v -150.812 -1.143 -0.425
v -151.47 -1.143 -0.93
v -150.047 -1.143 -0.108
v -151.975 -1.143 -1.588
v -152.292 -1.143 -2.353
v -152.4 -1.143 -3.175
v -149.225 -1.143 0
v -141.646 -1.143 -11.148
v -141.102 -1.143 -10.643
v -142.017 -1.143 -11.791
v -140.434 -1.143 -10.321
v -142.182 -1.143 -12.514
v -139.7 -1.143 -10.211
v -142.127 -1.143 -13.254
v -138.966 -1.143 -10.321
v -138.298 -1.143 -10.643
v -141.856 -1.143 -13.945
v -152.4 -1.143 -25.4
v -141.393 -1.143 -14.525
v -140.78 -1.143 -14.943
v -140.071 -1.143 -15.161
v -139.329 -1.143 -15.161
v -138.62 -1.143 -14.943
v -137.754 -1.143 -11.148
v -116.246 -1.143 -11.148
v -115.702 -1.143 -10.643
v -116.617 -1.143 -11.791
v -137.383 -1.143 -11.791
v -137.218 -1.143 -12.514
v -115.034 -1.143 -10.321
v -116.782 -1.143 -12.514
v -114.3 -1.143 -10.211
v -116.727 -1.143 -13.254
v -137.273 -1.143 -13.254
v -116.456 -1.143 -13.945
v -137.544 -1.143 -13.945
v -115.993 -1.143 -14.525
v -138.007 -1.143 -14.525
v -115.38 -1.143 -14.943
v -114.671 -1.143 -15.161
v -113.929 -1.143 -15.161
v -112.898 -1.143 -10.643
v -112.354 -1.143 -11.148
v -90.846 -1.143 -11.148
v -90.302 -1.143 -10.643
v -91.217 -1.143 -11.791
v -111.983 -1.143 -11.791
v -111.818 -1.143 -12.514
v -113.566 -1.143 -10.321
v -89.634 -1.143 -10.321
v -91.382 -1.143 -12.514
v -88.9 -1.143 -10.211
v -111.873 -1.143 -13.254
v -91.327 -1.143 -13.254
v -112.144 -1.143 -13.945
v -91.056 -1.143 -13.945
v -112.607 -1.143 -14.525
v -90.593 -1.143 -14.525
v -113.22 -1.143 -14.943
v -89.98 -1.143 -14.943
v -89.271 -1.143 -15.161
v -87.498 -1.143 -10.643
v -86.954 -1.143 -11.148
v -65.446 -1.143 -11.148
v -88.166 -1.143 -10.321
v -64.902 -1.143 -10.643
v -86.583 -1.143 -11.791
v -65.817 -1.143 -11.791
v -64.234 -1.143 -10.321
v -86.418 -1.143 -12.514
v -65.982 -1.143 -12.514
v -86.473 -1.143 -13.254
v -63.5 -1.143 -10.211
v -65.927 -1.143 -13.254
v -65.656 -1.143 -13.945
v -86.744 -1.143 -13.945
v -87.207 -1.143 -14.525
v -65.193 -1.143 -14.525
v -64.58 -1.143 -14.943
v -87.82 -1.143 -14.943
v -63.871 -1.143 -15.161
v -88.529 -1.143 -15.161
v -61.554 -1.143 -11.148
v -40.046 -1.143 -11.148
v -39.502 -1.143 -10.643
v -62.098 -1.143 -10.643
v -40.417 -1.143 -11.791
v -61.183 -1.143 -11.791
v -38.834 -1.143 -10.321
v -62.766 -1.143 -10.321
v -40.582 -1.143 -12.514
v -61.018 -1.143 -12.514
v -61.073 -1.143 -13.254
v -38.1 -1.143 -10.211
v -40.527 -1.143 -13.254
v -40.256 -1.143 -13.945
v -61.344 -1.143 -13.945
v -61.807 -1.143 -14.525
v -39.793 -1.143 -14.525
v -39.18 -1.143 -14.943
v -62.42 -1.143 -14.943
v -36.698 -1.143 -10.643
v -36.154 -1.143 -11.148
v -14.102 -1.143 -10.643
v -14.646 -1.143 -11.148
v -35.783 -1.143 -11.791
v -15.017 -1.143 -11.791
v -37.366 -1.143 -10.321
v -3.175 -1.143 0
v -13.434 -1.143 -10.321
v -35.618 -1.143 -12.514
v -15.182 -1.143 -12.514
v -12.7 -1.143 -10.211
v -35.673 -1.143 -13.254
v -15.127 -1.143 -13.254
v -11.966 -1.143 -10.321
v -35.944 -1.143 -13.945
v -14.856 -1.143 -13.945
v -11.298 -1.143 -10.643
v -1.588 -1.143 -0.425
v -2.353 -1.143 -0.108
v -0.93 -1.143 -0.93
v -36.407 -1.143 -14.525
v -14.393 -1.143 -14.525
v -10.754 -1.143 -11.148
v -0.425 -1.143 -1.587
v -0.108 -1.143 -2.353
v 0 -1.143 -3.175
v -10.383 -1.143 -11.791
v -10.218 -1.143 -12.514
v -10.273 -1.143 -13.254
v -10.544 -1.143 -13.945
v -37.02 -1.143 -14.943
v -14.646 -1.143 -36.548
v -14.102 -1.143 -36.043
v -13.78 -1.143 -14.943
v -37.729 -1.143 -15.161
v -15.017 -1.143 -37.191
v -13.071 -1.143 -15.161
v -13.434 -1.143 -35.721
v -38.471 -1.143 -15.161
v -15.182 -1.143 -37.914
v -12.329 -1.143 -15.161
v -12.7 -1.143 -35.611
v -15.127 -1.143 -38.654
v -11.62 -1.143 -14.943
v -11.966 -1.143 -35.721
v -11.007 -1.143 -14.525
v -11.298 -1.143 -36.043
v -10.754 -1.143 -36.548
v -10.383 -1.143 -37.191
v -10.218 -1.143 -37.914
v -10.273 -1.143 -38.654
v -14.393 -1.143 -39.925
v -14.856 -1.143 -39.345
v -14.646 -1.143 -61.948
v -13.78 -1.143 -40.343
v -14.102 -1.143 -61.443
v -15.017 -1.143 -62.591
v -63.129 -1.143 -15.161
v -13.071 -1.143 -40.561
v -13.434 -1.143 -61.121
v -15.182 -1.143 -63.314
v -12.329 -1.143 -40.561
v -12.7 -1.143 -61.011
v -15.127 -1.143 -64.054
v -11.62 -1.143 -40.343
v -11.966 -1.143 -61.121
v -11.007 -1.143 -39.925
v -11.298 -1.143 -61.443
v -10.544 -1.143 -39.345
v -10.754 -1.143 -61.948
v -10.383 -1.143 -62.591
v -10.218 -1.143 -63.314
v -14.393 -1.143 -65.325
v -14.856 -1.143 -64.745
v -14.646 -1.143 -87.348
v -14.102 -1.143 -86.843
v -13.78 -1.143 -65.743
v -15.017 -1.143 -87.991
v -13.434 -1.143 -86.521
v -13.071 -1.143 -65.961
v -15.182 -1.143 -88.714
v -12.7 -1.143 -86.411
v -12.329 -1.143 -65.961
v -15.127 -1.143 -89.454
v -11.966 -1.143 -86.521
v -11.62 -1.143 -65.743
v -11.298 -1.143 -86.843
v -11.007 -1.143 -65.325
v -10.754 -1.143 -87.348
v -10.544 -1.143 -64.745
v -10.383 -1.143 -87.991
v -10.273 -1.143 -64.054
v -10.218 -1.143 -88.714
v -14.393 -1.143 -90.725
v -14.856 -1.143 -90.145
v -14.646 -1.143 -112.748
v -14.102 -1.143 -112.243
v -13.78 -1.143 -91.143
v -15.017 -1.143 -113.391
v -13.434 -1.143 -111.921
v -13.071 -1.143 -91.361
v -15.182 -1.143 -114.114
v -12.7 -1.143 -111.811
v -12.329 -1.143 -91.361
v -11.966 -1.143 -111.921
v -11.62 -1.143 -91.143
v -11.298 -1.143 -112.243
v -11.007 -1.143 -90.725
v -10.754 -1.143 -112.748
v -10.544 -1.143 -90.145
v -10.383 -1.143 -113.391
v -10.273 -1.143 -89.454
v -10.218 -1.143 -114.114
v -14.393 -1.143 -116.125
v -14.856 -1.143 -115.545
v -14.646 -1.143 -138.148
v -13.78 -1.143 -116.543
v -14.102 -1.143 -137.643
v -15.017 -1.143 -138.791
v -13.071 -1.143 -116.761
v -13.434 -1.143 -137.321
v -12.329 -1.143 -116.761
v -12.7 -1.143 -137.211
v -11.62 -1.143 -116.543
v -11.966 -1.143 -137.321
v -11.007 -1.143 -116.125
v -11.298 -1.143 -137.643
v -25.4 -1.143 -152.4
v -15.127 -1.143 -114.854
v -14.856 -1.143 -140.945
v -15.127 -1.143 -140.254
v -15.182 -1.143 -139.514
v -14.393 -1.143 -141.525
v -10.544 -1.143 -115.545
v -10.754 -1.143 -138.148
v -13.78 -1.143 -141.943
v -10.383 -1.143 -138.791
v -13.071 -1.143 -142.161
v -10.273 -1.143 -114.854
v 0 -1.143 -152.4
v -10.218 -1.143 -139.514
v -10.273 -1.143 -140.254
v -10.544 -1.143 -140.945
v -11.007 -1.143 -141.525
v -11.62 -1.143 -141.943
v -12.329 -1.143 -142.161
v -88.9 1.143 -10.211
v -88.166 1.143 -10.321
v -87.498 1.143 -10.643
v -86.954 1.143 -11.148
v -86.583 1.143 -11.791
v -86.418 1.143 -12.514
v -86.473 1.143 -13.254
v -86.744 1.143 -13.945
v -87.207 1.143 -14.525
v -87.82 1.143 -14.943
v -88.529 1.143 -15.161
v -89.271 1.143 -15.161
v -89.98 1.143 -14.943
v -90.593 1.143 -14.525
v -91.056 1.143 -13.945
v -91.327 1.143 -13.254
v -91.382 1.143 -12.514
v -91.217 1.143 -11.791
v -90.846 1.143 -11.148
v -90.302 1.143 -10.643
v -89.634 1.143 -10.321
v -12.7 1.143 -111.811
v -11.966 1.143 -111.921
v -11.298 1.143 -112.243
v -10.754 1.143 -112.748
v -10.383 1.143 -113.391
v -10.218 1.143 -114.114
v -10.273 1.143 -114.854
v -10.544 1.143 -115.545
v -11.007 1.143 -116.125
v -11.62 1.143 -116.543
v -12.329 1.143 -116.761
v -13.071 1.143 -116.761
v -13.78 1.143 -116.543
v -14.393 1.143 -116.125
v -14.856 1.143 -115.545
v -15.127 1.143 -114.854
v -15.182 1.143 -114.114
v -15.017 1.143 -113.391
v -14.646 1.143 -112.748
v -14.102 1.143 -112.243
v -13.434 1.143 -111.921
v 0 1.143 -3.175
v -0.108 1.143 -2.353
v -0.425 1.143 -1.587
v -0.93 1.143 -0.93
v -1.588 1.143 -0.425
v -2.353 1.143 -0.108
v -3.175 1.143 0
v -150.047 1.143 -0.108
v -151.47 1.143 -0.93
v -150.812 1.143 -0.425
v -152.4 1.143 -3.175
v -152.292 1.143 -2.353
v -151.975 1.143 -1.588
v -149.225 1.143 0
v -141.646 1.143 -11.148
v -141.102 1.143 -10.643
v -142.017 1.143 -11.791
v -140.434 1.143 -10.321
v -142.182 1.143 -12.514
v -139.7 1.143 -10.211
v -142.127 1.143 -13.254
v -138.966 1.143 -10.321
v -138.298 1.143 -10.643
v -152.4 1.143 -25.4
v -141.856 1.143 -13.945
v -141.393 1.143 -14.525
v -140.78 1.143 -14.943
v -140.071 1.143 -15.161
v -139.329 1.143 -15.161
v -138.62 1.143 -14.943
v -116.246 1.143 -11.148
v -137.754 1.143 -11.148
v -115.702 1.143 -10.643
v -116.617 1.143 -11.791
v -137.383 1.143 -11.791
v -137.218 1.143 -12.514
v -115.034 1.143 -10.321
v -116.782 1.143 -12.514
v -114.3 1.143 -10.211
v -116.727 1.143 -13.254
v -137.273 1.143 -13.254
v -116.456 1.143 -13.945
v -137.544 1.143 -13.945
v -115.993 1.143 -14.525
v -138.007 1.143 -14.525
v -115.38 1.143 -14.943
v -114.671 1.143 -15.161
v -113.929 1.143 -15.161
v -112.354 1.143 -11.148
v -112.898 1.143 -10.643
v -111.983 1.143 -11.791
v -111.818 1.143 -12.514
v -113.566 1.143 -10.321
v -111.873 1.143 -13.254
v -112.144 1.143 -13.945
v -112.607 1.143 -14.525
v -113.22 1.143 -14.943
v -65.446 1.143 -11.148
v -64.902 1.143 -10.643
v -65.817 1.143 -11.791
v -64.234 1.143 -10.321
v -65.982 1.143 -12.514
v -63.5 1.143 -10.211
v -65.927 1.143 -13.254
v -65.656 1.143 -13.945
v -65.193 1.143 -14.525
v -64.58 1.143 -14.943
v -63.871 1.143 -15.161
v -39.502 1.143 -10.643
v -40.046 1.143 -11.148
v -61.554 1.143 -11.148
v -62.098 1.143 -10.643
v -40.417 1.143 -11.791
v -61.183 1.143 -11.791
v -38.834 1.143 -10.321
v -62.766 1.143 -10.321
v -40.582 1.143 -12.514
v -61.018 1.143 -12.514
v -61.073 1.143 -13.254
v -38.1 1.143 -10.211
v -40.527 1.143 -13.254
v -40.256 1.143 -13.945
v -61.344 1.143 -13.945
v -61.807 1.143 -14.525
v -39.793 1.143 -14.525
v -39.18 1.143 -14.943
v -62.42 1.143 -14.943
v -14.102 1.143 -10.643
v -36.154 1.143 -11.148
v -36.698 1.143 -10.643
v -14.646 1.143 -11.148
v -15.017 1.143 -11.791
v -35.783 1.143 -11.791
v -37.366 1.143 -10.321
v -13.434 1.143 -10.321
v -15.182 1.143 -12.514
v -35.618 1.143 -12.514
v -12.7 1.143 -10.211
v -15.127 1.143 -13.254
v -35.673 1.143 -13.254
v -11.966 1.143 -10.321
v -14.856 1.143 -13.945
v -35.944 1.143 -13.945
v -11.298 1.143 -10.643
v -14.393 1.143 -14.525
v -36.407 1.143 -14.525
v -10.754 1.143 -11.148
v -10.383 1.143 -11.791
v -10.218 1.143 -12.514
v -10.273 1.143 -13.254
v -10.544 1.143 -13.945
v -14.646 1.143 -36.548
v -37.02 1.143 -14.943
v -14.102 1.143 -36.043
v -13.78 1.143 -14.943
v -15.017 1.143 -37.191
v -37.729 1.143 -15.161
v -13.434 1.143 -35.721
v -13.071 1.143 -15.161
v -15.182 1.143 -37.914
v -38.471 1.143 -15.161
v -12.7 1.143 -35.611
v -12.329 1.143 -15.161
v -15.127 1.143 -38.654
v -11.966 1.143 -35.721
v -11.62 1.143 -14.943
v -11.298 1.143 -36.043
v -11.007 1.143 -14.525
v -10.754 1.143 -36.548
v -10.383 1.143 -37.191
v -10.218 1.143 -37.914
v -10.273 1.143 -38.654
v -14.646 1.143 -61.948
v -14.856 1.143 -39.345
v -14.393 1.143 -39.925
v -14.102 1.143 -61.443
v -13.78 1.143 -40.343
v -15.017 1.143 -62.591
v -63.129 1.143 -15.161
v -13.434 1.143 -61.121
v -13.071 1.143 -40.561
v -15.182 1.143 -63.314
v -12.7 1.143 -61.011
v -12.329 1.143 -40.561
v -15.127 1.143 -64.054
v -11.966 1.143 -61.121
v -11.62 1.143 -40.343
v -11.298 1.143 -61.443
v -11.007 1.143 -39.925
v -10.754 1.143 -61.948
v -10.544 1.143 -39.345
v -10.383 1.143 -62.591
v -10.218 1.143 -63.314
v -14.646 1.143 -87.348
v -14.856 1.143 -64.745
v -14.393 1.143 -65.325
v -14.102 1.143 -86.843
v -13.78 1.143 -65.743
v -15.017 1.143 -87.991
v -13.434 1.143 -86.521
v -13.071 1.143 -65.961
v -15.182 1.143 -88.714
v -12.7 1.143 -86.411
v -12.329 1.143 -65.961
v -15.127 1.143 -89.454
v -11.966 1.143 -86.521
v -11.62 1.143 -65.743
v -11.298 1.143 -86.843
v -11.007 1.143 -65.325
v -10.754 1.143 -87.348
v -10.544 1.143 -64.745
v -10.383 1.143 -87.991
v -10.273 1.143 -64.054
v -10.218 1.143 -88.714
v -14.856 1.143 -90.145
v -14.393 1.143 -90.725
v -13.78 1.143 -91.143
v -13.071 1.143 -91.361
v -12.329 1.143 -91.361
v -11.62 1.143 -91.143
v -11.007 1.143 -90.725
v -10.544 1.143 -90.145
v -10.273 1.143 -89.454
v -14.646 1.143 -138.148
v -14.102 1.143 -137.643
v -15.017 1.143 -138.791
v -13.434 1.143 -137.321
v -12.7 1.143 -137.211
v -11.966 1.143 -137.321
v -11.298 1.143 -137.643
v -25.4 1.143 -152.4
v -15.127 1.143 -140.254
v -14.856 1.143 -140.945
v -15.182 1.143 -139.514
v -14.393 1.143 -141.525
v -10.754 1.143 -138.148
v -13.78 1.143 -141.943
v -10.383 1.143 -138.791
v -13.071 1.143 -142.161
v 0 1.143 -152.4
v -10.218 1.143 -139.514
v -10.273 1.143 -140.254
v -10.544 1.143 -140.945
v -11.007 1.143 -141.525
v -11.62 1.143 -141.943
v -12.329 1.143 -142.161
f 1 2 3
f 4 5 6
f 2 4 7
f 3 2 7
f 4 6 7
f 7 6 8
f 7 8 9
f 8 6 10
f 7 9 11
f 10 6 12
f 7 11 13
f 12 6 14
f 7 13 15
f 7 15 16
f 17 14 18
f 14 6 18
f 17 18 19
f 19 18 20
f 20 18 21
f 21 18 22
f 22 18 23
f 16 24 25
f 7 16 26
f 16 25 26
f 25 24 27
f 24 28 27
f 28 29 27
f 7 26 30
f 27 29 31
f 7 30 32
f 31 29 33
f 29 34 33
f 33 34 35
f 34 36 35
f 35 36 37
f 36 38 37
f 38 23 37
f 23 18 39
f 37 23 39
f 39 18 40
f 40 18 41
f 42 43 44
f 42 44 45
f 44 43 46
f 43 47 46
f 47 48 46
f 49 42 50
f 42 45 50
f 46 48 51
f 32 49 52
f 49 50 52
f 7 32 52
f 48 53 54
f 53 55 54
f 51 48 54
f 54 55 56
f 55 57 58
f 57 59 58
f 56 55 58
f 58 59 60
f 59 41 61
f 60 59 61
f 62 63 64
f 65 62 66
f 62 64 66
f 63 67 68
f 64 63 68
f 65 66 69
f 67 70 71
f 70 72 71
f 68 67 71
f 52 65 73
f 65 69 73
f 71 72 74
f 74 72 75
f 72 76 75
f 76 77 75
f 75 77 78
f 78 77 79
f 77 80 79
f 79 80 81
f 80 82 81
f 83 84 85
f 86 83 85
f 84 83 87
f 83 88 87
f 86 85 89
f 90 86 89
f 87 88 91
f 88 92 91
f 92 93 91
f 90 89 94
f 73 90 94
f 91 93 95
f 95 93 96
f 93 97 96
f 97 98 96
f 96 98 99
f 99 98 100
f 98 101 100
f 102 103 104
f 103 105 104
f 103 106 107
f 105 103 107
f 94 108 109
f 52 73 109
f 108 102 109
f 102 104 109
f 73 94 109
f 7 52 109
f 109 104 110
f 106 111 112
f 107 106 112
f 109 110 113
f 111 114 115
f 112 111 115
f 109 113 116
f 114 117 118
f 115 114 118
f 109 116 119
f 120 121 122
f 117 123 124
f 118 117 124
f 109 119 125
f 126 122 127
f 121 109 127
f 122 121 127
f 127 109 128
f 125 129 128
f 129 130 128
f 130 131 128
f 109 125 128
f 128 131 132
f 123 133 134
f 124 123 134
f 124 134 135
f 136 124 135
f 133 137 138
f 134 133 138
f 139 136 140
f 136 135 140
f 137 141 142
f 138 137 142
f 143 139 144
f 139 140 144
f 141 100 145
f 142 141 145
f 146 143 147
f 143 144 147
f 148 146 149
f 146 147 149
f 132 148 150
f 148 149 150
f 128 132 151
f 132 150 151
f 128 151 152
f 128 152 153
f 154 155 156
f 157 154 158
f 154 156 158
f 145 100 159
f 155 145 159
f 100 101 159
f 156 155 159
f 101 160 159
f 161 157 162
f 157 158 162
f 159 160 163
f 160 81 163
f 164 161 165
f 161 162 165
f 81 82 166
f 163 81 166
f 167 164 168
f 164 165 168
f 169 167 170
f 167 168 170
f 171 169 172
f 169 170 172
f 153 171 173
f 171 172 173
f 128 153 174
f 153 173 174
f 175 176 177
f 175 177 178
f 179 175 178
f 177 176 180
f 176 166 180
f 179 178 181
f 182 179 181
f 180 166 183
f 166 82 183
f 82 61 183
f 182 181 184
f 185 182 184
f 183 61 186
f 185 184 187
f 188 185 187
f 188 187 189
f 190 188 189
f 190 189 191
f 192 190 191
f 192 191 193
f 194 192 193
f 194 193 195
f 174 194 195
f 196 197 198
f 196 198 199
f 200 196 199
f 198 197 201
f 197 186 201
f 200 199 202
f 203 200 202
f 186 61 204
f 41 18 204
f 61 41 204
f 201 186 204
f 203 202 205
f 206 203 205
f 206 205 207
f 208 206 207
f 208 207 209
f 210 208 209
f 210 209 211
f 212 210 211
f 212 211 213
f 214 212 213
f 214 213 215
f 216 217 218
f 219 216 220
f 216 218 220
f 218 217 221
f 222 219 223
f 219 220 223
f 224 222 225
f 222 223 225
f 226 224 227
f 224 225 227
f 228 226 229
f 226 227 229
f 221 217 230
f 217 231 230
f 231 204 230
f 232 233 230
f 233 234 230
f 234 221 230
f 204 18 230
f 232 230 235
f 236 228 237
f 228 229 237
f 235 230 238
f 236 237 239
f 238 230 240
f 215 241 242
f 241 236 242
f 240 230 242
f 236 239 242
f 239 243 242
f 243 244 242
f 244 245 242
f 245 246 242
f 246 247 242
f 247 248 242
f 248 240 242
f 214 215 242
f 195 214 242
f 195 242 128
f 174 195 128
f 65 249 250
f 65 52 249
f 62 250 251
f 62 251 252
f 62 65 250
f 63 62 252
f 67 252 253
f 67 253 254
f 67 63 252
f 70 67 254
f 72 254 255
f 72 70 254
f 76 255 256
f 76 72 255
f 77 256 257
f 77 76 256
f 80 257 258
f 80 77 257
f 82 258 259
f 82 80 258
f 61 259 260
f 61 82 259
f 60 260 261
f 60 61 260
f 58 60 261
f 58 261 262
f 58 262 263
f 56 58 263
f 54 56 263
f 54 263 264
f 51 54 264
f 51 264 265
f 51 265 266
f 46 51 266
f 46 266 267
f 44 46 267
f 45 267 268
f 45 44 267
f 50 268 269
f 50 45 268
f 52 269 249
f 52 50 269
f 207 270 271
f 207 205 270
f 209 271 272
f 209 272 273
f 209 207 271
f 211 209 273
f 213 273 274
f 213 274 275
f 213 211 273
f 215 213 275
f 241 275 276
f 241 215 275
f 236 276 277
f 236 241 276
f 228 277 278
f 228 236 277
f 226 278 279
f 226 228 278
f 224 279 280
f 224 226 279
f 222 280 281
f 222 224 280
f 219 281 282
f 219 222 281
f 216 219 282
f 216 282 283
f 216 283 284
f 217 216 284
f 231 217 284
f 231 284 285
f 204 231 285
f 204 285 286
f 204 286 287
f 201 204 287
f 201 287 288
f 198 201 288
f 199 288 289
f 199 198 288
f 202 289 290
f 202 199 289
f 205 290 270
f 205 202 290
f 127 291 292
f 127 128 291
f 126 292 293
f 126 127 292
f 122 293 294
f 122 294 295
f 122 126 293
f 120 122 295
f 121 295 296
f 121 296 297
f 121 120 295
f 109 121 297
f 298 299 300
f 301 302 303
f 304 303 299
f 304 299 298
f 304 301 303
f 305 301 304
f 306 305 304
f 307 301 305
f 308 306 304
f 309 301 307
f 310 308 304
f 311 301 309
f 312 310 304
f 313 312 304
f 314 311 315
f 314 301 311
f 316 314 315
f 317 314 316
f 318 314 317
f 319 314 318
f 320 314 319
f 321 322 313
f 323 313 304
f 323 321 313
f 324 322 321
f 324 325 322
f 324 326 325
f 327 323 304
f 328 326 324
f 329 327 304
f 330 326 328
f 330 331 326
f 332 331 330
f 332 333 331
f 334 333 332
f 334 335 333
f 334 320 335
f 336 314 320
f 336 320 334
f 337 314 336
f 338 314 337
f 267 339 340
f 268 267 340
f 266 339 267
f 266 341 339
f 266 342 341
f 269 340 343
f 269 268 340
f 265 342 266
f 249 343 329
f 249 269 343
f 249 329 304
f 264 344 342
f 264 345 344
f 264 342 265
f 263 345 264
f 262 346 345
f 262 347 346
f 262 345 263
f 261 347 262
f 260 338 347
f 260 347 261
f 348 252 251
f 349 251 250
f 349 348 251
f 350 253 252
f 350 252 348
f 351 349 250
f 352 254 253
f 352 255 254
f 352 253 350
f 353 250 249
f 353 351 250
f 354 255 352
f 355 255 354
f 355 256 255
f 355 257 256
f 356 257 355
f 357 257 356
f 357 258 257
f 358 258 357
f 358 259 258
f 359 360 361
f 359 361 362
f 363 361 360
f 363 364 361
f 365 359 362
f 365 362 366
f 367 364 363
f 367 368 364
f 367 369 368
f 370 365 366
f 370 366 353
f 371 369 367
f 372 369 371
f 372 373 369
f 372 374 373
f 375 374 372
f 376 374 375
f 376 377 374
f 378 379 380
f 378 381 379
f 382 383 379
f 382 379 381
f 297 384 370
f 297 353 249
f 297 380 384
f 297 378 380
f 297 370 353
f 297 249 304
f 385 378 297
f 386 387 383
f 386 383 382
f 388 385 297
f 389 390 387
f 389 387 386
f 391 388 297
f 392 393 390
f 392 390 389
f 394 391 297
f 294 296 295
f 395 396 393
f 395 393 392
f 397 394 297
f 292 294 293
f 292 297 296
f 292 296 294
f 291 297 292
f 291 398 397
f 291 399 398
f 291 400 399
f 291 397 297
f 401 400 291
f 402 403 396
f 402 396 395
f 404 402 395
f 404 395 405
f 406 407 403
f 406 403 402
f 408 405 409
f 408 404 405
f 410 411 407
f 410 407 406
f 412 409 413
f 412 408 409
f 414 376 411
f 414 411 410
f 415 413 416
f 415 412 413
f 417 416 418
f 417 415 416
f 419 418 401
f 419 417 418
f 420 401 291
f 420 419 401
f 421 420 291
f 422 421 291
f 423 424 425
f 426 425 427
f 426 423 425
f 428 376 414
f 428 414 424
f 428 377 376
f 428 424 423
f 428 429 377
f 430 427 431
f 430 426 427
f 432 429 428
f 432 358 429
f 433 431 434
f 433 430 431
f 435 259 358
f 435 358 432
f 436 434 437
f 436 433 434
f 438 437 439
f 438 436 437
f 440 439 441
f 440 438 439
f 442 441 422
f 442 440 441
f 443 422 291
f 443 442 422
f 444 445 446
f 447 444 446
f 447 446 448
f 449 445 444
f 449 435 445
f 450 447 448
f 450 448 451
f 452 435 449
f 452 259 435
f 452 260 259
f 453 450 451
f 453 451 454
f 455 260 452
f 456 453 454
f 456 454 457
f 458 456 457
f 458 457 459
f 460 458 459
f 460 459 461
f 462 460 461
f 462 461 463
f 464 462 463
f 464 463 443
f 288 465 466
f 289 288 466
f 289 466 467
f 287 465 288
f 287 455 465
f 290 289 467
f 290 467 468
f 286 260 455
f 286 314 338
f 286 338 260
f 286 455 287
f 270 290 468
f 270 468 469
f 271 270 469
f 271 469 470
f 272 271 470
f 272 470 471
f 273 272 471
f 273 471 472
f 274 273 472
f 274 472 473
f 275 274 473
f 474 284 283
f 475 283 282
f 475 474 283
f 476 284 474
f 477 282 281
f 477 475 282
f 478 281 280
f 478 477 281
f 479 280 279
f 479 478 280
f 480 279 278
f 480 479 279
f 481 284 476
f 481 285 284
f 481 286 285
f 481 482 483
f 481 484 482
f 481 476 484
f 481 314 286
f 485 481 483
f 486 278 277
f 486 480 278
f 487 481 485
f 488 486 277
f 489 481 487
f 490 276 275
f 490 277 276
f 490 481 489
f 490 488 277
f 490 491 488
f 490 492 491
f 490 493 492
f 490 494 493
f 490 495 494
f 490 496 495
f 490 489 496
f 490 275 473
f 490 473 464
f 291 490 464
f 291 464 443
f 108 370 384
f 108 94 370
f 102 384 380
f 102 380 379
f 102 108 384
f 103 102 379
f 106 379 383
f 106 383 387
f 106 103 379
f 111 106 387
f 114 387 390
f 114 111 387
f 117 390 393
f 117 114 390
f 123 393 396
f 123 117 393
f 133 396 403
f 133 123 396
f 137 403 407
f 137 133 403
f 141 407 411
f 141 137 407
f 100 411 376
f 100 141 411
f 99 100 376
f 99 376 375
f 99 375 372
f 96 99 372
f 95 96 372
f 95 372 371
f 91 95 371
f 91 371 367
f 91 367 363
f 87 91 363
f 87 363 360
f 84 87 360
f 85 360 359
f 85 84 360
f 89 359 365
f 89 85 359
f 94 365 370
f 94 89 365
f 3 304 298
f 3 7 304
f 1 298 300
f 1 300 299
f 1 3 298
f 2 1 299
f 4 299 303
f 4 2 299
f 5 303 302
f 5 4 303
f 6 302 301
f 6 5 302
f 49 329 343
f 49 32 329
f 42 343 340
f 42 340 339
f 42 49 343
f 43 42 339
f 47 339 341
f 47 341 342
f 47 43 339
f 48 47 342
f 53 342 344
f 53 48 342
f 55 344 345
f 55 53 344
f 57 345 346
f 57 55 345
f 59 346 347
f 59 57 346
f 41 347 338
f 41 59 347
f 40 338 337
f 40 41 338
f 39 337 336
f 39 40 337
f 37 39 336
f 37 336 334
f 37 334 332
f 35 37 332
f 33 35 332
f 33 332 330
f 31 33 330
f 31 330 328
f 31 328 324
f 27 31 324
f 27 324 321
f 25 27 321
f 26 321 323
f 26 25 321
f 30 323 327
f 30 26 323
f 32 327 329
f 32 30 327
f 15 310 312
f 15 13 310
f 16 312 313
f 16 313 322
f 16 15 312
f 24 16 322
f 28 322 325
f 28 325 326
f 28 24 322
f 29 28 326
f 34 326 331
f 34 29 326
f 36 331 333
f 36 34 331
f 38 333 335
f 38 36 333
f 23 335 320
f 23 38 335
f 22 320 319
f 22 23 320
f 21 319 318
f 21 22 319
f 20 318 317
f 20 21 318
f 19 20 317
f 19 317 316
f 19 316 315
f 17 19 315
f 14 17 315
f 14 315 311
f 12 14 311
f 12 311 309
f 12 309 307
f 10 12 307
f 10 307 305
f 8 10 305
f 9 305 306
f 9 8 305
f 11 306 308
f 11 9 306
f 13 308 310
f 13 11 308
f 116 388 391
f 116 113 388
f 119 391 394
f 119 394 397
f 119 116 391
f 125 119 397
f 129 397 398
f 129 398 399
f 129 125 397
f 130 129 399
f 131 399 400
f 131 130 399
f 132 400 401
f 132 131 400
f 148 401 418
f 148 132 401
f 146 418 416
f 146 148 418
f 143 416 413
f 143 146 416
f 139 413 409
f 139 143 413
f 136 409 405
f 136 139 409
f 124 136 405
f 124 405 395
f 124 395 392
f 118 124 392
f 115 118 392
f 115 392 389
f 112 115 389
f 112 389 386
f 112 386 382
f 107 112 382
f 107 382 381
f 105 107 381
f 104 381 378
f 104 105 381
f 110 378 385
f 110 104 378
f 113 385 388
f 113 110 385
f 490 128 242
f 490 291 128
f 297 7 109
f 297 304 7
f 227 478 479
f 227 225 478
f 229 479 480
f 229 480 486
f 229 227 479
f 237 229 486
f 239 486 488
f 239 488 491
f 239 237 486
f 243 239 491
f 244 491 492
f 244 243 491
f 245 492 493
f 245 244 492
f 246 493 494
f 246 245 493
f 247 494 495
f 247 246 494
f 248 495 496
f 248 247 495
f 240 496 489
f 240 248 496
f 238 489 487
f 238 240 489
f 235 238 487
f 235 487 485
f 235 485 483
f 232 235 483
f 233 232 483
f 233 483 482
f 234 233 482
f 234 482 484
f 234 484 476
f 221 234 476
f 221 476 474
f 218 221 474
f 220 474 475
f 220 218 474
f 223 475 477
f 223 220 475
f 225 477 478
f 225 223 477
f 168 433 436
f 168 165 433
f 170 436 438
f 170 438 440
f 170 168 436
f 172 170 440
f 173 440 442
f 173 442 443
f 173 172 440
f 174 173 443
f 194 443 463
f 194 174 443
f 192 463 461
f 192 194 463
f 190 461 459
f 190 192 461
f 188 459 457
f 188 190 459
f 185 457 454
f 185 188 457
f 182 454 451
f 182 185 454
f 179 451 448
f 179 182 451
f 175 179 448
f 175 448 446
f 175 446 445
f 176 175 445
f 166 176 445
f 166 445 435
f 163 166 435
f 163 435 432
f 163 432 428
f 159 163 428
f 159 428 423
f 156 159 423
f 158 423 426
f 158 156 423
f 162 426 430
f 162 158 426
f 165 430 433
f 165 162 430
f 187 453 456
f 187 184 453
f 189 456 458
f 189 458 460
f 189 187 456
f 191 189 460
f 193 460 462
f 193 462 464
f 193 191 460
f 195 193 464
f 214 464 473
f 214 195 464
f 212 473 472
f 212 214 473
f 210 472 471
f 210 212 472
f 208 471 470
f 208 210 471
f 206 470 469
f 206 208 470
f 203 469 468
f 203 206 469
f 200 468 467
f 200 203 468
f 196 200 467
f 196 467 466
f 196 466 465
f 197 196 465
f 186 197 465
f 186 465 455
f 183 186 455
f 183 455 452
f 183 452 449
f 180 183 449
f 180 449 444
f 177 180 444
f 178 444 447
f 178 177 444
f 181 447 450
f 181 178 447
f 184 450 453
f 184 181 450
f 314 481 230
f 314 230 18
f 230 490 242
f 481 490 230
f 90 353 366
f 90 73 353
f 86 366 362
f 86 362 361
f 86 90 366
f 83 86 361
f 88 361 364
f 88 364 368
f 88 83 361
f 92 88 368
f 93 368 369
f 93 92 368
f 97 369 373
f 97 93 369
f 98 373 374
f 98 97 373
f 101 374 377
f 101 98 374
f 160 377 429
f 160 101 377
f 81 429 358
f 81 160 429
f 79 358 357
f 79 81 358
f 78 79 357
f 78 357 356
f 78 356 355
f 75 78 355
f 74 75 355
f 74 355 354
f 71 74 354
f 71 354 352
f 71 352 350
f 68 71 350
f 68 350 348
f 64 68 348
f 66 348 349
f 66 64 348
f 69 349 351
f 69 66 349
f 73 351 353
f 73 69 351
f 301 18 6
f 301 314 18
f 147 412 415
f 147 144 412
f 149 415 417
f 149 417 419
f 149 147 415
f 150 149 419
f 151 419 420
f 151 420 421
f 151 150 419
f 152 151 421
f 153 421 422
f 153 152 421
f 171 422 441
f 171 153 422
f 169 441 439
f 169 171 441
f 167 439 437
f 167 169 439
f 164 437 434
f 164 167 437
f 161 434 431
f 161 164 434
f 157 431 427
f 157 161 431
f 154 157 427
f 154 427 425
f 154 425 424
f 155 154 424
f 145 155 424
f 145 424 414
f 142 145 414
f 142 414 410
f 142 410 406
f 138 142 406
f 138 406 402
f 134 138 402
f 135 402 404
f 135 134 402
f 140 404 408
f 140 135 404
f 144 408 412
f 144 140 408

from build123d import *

# Parameters (mm, degrees)
SKETCH1_R           = 2.4892
BOSS_EXTRUDE2_DEPTH = 1.143
FILLET1_R           = 3.175


with BuildPart() as part:
    # Sketch1 → Boss-Extrude2 (new, symmetric)
    with BuildSketch(Plane(origin=(0, 0, 0), x_dir=(1, 0, 0), z_dir=(0, 1, 0))):
        Polygon((0, 0), (0, 152.4), (-25.4, 152.4), (-152.4, 25.4), (-152.4, 0), align=None)
        with Locations(Location((-12.7, 12.7, 0), (0, 0, 270))):
            Circle(SKETCH1_R, mode=Mode.SUBTRACT)
        with Locations(Location((-38.1, 12.7, 0), (0, 0, 270))):
            Circle(SKETCH1_R, mode=Mode.SUBTRACT)
        with Locations(Location((-63.5, 12.7, 0), (0, 0, 270))):
            Circle(SKETCH1_R, mode=Mode.SUBTRACT)
        with Locations(Location((-88.9, 12.7, 0), (0, 0, 270))):
            Circle(SKETCH1_R, mode=Mode.SUBTRACT)
        with Locations(Location((-114.3, 12.7, 0), (0, 0, 270))):
            Circle(SKETCH1_R, mode=Mode.SUBTRACT)
        with Locations(Location((-12.7, 38.1, 0), (0, 0, 270))):
            Circle(SKETCH1_R, mode=Mode.SUBTRACT)
        with Locations(Location((-12.7, 63.5, 0), (0, 0, 270))):
            Circle(SKETCH1_R, mode=Mode.SUBTRACT)
        with Locations(Location((-12.7, 88.9, 0), (0, 0, 270))):
            Circle(SKETCH1_R, mode=Mode.SUBTRACT)
        with Locations(Location((-12.7, 114.3, 0), (0, 0, 270))):
            Circle(SKETCH1_R, mode=Mode.SUBTRACT)
        with Locations(Location((-139.7, 12.7, 0), (0, 0, 270))):
            Circle(SKETCH1_R, mode=Mode.SUBTRACT)
        with Locations(Location((-12.7, 139.7, 0), (0, 0, 270))):
            Circle(SKETCH1_R, mode=Mode.SUBTRACT)
    extrude(amount=BOSS_EXTRUDE2_DEPTH, both=True)

    # Fillet1
    fillet1_edges = [part.edges().sort_by_distance(p)[0] for p in [
        (-152.4, 0, 0),
        (0, 0, 0),
    ]]
    fillet(fillet1_edges, radius=FILLET1_R)


solid = part.part
